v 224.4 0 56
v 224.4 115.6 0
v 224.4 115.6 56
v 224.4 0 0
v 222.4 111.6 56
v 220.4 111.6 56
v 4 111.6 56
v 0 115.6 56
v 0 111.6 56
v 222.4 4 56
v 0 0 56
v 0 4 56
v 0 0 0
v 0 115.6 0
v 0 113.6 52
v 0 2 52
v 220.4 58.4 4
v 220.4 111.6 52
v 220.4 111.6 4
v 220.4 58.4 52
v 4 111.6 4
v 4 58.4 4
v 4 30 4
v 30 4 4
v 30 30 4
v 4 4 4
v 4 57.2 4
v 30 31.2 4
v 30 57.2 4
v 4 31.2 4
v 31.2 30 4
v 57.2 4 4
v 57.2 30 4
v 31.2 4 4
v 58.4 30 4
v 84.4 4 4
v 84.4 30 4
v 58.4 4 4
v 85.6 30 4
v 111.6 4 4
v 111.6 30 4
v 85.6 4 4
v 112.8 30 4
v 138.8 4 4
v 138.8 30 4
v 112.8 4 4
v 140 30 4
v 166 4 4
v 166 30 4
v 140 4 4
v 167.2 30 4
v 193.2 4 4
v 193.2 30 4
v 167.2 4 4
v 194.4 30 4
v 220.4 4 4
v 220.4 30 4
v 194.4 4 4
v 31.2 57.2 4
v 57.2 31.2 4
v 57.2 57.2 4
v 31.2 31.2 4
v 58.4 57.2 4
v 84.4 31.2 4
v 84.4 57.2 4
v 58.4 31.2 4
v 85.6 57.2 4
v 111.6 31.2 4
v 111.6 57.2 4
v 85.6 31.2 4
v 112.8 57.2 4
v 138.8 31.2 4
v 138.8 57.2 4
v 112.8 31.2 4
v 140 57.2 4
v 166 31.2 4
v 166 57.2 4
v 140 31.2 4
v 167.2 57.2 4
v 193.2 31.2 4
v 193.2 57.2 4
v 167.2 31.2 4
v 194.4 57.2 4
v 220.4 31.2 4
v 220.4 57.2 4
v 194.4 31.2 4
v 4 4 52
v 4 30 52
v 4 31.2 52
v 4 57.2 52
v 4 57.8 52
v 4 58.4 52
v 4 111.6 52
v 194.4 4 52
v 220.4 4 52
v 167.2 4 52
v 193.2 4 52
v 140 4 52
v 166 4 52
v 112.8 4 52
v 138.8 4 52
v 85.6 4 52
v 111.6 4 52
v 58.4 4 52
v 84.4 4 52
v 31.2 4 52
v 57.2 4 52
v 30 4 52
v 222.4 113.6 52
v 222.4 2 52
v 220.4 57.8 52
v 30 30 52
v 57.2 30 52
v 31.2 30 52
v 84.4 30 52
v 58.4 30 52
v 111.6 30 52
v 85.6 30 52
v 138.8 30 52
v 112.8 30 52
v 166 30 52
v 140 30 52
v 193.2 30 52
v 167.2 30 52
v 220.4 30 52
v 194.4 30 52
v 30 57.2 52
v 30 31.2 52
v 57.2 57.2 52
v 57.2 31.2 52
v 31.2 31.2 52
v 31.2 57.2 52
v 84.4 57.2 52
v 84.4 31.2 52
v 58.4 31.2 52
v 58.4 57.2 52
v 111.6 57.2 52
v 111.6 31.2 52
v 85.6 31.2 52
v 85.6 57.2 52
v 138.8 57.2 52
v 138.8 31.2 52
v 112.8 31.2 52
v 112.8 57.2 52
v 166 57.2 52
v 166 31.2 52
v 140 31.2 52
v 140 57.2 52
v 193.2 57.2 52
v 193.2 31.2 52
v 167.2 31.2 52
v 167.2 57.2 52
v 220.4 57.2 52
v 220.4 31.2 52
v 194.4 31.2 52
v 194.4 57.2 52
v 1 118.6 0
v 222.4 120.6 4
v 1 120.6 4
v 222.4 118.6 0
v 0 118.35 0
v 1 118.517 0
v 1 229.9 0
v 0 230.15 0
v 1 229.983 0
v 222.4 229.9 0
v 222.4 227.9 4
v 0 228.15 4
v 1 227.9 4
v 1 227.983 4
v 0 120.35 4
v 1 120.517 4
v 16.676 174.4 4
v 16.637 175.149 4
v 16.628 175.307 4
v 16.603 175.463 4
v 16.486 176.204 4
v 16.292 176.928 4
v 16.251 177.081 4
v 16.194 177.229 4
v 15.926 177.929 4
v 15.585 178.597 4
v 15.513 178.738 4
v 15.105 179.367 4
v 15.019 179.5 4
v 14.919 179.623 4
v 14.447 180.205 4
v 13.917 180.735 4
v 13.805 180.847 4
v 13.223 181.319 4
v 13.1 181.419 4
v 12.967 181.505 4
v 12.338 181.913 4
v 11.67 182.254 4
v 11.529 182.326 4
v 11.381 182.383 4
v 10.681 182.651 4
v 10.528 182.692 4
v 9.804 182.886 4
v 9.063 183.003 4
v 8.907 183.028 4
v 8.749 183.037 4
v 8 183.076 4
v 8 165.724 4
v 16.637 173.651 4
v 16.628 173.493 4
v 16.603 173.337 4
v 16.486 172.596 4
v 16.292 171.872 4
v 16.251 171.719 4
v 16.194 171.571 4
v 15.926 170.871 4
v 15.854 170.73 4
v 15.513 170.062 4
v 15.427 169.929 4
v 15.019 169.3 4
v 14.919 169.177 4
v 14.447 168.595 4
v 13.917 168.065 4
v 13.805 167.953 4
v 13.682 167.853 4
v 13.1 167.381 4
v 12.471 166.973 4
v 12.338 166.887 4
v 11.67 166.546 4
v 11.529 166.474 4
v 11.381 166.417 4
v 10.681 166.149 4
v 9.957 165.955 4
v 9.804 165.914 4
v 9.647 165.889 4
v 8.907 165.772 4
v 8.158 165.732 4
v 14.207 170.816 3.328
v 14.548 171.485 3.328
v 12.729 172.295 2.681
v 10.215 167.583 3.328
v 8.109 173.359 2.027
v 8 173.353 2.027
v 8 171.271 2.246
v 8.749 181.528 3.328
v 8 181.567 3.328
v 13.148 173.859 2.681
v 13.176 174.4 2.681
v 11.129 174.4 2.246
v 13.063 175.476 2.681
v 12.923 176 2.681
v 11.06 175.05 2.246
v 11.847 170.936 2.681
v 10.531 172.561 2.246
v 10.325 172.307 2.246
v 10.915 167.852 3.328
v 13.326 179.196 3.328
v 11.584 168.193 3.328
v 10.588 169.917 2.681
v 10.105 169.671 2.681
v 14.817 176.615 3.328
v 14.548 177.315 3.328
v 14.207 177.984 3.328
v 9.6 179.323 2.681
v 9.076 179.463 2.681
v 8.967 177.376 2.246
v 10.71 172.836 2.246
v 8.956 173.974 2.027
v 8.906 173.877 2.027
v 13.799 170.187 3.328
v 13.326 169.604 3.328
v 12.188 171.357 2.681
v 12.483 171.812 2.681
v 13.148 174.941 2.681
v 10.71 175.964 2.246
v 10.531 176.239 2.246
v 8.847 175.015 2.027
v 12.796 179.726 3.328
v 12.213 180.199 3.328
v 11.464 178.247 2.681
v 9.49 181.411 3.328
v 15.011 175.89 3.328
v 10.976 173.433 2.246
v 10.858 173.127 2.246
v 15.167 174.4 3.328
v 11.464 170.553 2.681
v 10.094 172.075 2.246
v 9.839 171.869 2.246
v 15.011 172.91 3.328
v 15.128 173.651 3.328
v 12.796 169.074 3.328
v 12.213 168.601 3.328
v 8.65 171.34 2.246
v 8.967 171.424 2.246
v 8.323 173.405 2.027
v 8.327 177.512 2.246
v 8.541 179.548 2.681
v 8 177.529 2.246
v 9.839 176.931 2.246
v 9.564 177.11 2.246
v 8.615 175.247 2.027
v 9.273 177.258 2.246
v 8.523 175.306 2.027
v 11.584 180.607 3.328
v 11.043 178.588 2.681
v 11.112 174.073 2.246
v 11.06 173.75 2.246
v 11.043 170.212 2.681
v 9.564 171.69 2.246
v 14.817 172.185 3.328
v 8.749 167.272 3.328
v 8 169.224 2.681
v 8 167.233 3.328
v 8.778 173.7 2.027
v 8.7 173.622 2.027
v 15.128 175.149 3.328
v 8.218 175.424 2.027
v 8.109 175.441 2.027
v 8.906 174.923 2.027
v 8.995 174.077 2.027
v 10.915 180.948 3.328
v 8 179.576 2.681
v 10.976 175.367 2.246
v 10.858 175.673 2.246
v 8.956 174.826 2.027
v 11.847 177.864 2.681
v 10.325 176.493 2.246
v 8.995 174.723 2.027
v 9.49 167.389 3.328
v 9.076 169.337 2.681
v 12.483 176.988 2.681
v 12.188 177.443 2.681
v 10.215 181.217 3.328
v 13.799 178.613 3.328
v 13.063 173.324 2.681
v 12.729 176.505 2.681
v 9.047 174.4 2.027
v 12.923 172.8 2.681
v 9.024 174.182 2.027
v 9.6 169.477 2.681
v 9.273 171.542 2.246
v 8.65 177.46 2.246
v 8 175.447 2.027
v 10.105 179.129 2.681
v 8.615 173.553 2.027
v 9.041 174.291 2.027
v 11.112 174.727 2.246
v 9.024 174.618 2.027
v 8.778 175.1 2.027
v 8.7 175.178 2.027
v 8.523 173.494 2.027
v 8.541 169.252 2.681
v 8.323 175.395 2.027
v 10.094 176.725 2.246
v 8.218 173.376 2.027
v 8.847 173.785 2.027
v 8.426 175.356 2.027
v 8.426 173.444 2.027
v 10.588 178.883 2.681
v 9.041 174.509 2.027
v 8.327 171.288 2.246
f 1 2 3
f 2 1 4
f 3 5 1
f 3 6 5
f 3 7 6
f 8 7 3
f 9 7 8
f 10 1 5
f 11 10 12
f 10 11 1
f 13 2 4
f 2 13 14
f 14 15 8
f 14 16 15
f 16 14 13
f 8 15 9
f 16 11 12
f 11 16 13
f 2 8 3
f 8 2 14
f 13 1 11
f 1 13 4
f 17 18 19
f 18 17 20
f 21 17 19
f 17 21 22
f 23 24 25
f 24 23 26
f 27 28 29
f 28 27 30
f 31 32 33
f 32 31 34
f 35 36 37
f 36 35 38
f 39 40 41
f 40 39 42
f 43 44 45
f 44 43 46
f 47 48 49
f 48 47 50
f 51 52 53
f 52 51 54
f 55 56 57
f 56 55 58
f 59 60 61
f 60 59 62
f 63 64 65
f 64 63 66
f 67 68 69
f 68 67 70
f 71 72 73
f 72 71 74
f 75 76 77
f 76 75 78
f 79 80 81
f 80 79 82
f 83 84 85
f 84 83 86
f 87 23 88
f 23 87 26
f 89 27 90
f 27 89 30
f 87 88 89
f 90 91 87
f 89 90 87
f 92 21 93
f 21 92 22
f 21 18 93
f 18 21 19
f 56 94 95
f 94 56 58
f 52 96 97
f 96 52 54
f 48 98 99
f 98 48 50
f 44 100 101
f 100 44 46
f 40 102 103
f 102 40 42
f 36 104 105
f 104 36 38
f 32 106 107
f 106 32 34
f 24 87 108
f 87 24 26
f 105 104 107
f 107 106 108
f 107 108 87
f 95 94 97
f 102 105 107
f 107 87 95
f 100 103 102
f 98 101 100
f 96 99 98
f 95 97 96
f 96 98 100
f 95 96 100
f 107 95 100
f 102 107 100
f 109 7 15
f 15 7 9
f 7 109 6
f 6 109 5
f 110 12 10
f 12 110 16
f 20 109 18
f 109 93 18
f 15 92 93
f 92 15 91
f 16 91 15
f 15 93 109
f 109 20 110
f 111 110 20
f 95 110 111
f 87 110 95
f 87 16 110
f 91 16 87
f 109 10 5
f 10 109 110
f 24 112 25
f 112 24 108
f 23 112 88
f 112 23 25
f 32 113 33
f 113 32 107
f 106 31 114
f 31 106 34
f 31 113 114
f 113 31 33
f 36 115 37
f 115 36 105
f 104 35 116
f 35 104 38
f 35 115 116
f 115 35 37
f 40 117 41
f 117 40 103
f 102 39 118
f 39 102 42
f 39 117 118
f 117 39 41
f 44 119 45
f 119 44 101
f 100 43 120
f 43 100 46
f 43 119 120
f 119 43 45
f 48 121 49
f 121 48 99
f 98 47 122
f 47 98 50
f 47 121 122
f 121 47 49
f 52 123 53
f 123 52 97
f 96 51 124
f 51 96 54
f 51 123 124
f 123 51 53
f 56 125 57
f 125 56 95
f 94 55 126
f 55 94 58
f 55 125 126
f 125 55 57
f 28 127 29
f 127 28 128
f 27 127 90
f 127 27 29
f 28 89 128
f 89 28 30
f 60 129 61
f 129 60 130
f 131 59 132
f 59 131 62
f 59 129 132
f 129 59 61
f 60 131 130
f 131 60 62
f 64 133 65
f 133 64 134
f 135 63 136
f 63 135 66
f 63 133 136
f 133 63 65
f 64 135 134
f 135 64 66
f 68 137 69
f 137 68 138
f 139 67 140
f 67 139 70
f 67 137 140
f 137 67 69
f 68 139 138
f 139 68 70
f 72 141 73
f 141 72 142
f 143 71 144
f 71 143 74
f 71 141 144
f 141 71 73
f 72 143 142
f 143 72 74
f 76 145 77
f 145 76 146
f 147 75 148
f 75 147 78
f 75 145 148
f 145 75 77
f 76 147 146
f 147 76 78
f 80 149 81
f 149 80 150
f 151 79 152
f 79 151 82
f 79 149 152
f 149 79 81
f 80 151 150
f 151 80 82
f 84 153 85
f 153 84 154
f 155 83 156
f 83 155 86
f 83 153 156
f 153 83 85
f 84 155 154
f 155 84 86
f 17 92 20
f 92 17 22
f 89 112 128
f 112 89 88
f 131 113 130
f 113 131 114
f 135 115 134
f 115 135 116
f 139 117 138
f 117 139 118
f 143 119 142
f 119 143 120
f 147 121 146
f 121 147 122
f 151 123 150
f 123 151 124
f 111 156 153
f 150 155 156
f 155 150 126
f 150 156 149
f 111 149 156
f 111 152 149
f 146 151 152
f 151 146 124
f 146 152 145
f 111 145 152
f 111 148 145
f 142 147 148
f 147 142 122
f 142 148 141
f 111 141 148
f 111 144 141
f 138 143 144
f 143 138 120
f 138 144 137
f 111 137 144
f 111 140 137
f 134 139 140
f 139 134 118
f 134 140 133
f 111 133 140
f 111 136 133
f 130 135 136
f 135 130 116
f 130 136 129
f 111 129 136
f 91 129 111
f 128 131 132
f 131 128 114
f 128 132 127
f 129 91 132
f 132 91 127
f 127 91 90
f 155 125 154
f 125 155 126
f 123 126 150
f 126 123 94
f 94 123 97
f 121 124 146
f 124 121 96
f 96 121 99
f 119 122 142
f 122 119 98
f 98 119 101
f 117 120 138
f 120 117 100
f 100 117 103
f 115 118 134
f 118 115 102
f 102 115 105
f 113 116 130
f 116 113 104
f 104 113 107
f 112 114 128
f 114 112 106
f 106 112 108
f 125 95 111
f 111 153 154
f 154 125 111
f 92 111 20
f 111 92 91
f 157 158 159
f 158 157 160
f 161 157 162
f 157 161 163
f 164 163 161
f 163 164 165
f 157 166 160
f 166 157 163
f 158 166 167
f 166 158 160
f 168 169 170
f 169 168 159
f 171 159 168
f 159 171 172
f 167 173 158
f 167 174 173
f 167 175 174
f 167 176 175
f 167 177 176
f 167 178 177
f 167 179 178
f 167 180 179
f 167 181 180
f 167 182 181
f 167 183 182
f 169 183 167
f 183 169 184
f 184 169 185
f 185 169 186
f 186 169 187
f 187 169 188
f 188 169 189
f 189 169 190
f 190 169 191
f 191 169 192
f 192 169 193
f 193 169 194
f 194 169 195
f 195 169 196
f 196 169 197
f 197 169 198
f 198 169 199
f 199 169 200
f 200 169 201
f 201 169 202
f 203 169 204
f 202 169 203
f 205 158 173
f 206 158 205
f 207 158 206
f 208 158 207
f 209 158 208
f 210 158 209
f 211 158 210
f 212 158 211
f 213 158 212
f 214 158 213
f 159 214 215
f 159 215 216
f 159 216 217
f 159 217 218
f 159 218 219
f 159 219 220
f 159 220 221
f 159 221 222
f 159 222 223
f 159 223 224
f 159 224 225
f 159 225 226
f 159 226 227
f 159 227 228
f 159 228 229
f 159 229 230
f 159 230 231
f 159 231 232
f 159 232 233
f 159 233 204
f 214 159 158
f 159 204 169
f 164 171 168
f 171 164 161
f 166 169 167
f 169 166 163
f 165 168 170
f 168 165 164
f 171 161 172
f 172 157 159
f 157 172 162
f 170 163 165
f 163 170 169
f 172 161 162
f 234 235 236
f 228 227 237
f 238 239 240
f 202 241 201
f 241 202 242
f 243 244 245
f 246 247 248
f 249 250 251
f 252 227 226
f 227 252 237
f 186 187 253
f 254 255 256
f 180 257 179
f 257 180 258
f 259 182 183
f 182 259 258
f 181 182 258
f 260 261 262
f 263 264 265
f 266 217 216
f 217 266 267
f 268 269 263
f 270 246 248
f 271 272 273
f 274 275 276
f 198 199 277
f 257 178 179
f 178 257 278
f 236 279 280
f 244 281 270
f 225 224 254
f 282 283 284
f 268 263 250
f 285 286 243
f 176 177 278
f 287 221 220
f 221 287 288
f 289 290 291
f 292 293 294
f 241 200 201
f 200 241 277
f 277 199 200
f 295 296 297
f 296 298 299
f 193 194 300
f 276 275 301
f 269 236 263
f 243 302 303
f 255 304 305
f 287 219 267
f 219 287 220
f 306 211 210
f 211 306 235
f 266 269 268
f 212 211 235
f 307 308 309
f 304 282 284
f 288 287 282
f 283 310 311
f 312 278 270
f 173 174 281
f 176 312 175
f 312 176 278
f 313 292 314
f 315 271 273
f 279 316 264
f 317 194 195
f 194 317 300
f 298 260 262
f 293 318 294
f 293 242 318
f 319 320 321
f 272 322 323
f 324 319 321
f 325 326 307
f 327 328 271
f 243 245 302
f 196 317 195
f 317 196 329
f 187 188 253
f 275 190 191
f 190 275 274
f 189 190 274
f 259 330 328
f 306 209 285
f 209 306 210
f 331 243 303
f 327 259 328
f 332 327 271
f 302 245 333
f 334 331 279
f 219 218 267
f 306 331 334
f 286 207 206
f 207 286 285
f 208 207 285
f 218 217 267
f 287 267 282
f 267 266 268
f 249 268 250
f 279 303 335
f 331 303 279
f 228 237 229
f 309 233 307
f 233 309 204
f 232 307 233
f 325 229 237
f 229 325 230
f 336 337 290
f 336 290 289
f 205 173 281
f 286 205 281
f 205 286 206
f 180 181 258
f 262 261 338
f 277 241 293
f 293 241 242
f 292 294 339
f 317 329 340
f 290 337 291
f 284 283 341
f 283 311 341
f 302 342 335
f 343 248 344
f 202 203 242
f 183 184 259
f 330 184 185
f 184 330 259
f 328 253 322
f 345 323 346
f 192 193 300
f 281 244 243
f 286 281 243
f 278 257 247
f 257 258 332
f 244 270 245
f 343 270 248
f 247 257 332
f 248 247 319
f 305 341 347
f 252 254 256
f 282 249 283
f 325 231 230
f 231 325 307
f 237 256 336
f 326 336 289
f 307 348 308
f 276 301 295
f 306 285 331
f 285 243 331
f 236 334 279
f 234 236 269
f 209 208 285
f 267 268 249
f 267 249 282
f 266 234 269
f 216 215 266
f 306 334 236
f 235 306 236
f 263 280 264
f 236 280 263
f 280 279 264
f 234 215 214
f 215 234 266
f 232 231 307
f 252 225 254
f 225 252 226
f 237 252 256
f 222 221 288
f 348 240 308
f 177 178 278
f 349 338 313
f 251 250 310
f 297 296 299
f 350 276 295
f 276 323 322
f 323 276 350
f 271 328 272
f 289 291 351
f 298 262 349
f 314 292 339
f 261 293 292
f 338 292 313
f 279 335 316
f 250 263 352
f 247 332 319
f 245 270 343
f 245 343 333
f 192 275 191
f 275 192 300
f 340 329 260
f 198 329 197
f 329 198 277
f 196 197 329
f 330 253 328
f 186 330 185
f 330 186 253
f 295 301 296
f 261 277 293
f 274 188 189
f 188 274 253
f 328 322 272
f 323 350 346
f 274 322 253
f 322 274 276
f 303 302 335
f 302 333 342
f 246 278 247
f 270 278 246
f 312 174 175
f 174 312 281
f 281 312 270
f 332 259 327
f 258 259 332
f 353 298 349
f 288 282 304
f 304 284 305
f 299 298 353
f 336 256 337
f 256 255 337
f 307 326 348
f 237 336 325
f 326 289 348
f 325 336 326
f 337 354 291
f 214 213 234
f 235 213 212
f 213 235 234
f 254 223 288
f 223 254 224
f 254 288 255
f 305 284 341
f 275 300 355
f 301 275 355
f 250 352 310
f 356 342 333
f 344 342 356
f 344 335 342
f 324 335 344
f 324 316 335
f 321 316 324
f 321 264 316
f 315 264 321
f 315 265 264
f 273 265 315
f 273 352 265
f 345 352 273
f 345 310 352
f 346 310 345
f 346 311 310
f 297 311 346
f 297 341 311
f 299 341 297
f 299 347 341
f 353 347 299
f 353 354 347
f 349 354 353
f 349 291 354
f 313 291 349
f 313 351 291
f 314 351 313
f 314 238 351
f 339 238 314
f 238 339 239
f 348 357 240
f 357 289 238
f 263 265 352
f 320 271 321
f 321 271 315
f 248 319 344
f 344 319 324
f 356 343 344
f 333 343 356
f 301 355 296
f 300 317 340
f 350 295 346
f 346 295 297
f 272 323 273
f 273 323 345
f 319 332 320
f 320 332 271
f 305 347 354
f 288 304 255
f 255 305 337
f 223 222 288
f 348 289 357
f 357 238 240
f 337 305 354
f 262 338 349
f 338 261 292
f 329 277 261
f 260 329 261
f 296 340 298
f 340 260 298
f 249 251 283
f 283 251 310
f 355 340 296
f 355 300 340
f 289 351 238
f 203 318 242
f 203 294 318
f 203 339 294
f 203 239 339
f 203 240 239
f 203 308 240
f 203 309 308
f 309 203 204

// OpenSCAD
// Download both files into the same directory and make a copy of this template for each project. Adjust the variables and values as needed to override the defaults in this file as needed. In this way you can replace the `Ultimate_Box_Generator.scad` file with a new version without having to track and restore your changes.

// If you want to use any framework variables in calulations you must import them here. If you want to also change the variable you must use a second line below to do that.
wall=wall;
internal_wall=internal_wall;

// Include the framework. You can change the prefix to load from a shared path.
include    <Ultimate_Box_Generator.scad>;

// At this point you can start to adjust builtin varaibles and create your own. There are also some examples of more complex boxes at the end of the file.


// Parts to render. To do more complex opperations disable these and manually call make_box() and make_lid() instead.
show_box=true;	// Whether or not to render the box
show_lid=true;	// Whether or not to render the lid. To make open boxes with no lid set `show_lid=false` and `lid_type=5`.

// General Settings
//comp_size_deep = 12; // Depth of compartments
//comp_size_x = 50;	 // Size of compartments, X
//comp_size_y = 35;	 // Size of compartments, Y
//wall = 2.5;		    // Width of wall, see `internal_wall` below for alternate inner wall size.
//repeat_x = 1;		// Number of compartments, X
//repeat_y = 1;		// Number of compartments, Y
//tolerance=.15;      // Tolerance around lid.  If it's too tight, increase this. If it's too loose, decrease it.

// Box Rounding
//box_corner_radius=0; // Add a rounding affect to the corners of the box. Anything over `wall` will cause structure and lid problems.
//internal_corner_radius=0; // Add a rounding affect to the inside.
//mesh_corner_radius=0; // Leave a radius around each corner of the mesh. May hep with bridges.
//corner_fn=30;

// Supress individual walls.
//supress_walls_x=[]; // These are the walls running along the X axis. It should be an array of size [repeat_y-1][repeat_x].
//supress_walls_y=[]; // These are the walls running along the Y axis. It should be an array of size [repeat_x-1][repeat_y].
// Example for repeat_x=4, repeat_y=3:
//supress_walls_x=[[1,0,1,1],[0,1,0,1]];
//supress_walls_y=[[1,0,1],[0,1,1],[1,1,1]];
//supress_sides=false; // [X, Y, X, Y] Cutout/supress some sides. this may behave baddly with compartments or mesh.
//supress_sides_radius=wall; // Add a rounding to the cutout.
//supress_sides_offset=0; // 0, wall, [X, Y, Z] adjsut the coutout in all directions. + to grow, - so shrink
//supress_sides_fn=30;

// Mesh Settings
// To make rounded corners and no mesh use any `mesh_type` > 0 and set `strut_gap` to a high value.
// 0: No mesh, solid wall.
// 1: Single direction mesh.
// 2: Two direction cross mesh and 90 degree angle to eachother.
// 3: Two direction mesh but mirrored around 90 axsis instead or rotated 90 degrees.
// 4: Calculate angle across the diagonal of each opening. You will also want to change `strut_gap` to a large number and set `strut_count_min=1`.
// 5: No mesh, empty wall.
// 6: Honycomb. Also set `strut_width=wall/4` and `strut_gap=wall*2`. To big of a `strut_gap` may fail to print. Other shapes can be generated with `mesh_fn` and reducing `mesh_inset_padding` may help.
//mesh_type=0; // Mesh type, see above.
//mesh_rotation=0; // 0-90 degrees.
//mesh_alt_rotation=mesh_rotation; // Alternate rotation for top and bottom faces.
//mesh_do_sides=true; //[true, true, true, false] Include mesh on each side along axis. [X, Y, X, Y]
//mesh_do_bottom=false; // Include mesh on bottom plate.
//mesh_do_top=true; // Include mesh on top piece.
//mesh_do_interior=false; // Include mesh on inner walls.
//mesh_inset_padding=wall; // Leave some solid material before building strut frame. Anything less then wall/2 will likely fall apart.
//mesh_fn=mesh_type == 6 ? 6 : 40; // Complexity of curves in mesh's, increese for smoother curves.
//strut_width=wall*2; // Width of each strut, 0=hollow.
//strut_gap=wall; // Width of the air gap between each strut. 0=fine air gaps.
//strut_count_min=0; // Optinal minimum number of struts regardless of size calulations.
//alt_strut_width=strut_width; // Width of struts going the other directions.
//alt_strut_gap=strut_gap; // Width of gap going the other direction.
//alt_strut_count_min=strut_count_min; // Optinal minimum number of struts regardless of size calulations.
//mesh_overflow=0; // Extra rows to add to the mesh. For example in the Honeycomb partial hexegons will be created along the edges.

// Lid Settings
// 0: No Lid. top may be rounded and can cause other rendering changes.
// 1: Lid that slides off in the x direction.
// 2: Lid with a snapped in hinge that rotates open
// 3: Lid that snaps down onto the box. Also need to change lid_height to around 1.5mm.
// 4: Stackable version of cover 1 there boxes slide into one another. You will need one cover for the last box. (Not tested)
// 5: Oversized lid sits on top and has sides that extend down. (Needs snapp support)
//lid_type=1; // Lid type, see above.
//has_thumbhole=true; // Add gripping locations for easy opening.
//has_coinslot=false; // Add slot in the top for dropping in components.
//has_snap=true; // Add small ridges or snaps to lids to help keep them closed.
//coinslot_x=20;	// Size in X direction
//coinslot_y=2.5;	// Size in Y direction
//coinslot_corner_radius=0; // rounded coinslot corners if >0; best if less than half the shorter coinslot dimension
//z_tolerance=0;   // Z tolerance can be tweaked separately, to make the top of the sliding lid be flush with the top of the box itself.
//extra_bottom=.15; // Extra bottm wall height to fit type 4 slider.
//hinge_inset=.75; // Size of the hinge connection.
//snap_inset=.25; // Amount of overhang for snaps to snap into place.
//snap_tolerance=tolerance; // You may need to add tolerance around lid and snaps to let them move freely.
//lid_offset=3;		// This is how far away from the box to print the lid
//lid_height=wall*2;  // Height of lid. Must be greater than wall width for a `lid_type=5` lid to work. On Lid 3 is the depth of the inset snap.
//lid_fn=40; // Increese if printing thicker walls.
//lid_alt_offset=false; // Move lid in X instead of Y for printing.

//Internal Structure (You may need to turn off `mesh_do_sides` or `mesh_do_bottom` for good results.)
// You can also use `make_wall()` to manually add your own walls.
// 1: Rounded bottom frame.
// 2: Hexegon bottom frame. (To make this shape perfect set `comp_size_deep` to the width between to edges of the tile and set `comp_size_x` or `comp_size_y` to this this: `comp_size_deep / sqrt(3)*2`.
// 3: Rough bottom for make bits sit unevenly. (Partial)
// 4: Verical rounding on cordner. Set `internal_size_deep` to `comp_size_deep` and `internal_size_circle` to the shortest `comp_size` for a circle.
// 5: Vertical hexegon. Retulst may varry.
//internal_type=0; // Internal structure, see above.
//internal_rotate=false; // On lid axis or rotate to opposite.
//internal_size_deep=comp_size_deep/2; // How far into the box to start the internal structure. Should be `comp_size_deep/2` for type 1-2, `wall` for 3, or comp_size_deep for type 4-5.
//internal_size_circle=internal_type==1 ? internal_size_deep : internal_size_deep * 2 / sqrt(3); // Use this calculation, or the shorter comp_size for type 4-5.
//internal_fn=internal_type==1 || internal_type==4 ? 60 : 6; // Complexity of internal curves, may need to increase for larger or smoother curves.
//internal_wall=wall; // Custom size for internal walls.

// Text Settings
// 0: None.
// 1: Cutout. Remove material formt he wall.
// 2: Raised. If a mesh is ued part of it is filled in to hold the text. Lids 0 and 3 are printed upside down by default. With this option used they will require supports regardless of the orrientation printed.
//text_type=0; // Text type, see above.
//text_depth=wall/6; // Distance to cutout text or raise it. User `wall` to cut through.
//text_size=5; // Font Size.
//text_font="Courier New:style=Bold"; // Use Hepl -> Font List to see options.
//text_message="Red Player"; // Message Text, or use `["Line 1", "Line 2"]` for multiline.
//text_message_compartments=false;//[["AA", "BB", "CC"], ["AB", "BC", "CD"]]; // Custom text for compartments in top or bottom. Also support multiline as `[[ ["A", "B"] ]]`.
//text_sides=true;//[true, true, true, false]; // Sides to put text on, [X, Y, X, Y]
//text_top=true; // Put Text on the top.
//text_bottom=false; // Put Text on the bottom.
//text_rotation=0; // Rotate the top and bottom text by X degrees. 90 will rotate from the X axis to the Y axis.
//text_offset=0; // Text is verticaly centered in the wall. This may look "off" due to casing or hanging tails. You can manually adjust the vertical alignment with this setting.
//text_fn=30; // Complexity of the letters, may need to increese with larger fonts.
//text_backdrop_scale=[.9, 1.5]; // Font size scaleing used on the backdrop when `text_type=2` is used on sides with a mesh.

// Complex Structure
//make_complex_box=false; // Use an array of objects from `complex_box` to create many smaller boxes within the larger box.
//internal_grow_down=true; // If set compartments will be extruded into the larger box from the top to make a flush surface. (May make a model that uses a lot of material.
//internal_empty_bottom=false; // If set the area blow each box will be empty. This will not be printable on a FDM printer unless supports are included internally but still may save material and print time.



// In addition you can set `show_box=false;` and then call `make_box()` manually to join and remove more structure to it like in this example.
/*show_box=false;
difference() {
    make_box();
    translate([0, comp_size_y/2 + wall, 0])
    rotate([0, 90, 0])
    cylinder(comp_size_x +wall*2, 10, 10);
}*/

// You can also use calls to `make_internal_box` to create more complex boxes within a larger box that share a single lid.
/*show_box=false;
make_box();
intersection() {     
    faction_x=10; faction_y=comp_size_y; faction_z=5; faction_repeat_x=3; faction_repeat_y=1;
    faction_size_x=calc_size(faction_repeat_x, faction_x, wall=internal_wall, internal_wall=internal_wall);
faction_size_y=calc_size(faction_repeat_y, faction_y, wall=internal_wall, internal_wall=internal_wall);
    
    translate([wall, wall, wall])
    cube([faction_size_x - wall, faction_size_y - wall*2, comp_size_deep]);
            
    translate([wall-internal_wall, wall-internal_wall, wall-internal_wall])
    union() {
        translate([0, 0, 0])
        make_internal_box(faction_x, faction_y, faction_z, wall=internal_wall, repeat_x=faction_repeat_x, repeat_y=faction_repeat_y);
    }
}*/

// This exmaple wil make a complex series of boxes in a larger container. The object's can be used to position other oebjects and create internal structure.
/*comp_size_x = 200;
comp_size_y = 200;
comp_size_deep = 200;

internal_wall=wall/2;

comp1=make_object(x=10, y=30, z=45, offset_x=0, offset_y=0, repeat_x=3, repeat_y=1, color="Red");
comp2=make_object(x=35, y=40, z=45, offset_x=comp1[4][0], offset_y=0, repeat_x=1, repeat_y=1, color="Pink");
comp3=make_object(x=35, y=30, z=45, offset_x=comp2[4][0], offset_y=0, repeat_x=1, repeat_y=1, color="Orange");
comp4=make_object(x=150, y=100, z=75, offset_x=0, offset_y=comp1[4][1], repeat_x=1, repeat_y=1, color="Blue");

complex_box=[
    comp1, comp2, comp3, comp4,
    
];
make_complex_box=true;*/

internal_wall=1.2;
comp_size_x = (26+internal_wall)*8-internal_wall;
comp_size_y = (26+internal_wall)*4-internal_wall;
comp_size_deep = 48;
wall= 4;
comp1=make_object(x=26, y=26, z=48, offset_x=0, offset_y=0, repeat_x=8, repeat_y=2);
complex_box=[comp1];
make_complex_box=true;

// Some notes on complex prints:
/* OpenSCAD expereicne is required to do pretty much any type of customization or complex opperations. This will essentaily jsut make the containers within one larger object with a single lid. Alternatly multiple boxes could be reated and then joined together with translations to make a larger object with multiple lids. 
   Due to how variables are passed in OpenSCAD it can be tricky to get the parameters set on the parent box and child boxes as you want. It is best to use global variable assignmets to set the child box parameters, then pass overrides to the `make_box()` call yourself. (You have to also set `show_box=false;` if you ddo this.)
  */
